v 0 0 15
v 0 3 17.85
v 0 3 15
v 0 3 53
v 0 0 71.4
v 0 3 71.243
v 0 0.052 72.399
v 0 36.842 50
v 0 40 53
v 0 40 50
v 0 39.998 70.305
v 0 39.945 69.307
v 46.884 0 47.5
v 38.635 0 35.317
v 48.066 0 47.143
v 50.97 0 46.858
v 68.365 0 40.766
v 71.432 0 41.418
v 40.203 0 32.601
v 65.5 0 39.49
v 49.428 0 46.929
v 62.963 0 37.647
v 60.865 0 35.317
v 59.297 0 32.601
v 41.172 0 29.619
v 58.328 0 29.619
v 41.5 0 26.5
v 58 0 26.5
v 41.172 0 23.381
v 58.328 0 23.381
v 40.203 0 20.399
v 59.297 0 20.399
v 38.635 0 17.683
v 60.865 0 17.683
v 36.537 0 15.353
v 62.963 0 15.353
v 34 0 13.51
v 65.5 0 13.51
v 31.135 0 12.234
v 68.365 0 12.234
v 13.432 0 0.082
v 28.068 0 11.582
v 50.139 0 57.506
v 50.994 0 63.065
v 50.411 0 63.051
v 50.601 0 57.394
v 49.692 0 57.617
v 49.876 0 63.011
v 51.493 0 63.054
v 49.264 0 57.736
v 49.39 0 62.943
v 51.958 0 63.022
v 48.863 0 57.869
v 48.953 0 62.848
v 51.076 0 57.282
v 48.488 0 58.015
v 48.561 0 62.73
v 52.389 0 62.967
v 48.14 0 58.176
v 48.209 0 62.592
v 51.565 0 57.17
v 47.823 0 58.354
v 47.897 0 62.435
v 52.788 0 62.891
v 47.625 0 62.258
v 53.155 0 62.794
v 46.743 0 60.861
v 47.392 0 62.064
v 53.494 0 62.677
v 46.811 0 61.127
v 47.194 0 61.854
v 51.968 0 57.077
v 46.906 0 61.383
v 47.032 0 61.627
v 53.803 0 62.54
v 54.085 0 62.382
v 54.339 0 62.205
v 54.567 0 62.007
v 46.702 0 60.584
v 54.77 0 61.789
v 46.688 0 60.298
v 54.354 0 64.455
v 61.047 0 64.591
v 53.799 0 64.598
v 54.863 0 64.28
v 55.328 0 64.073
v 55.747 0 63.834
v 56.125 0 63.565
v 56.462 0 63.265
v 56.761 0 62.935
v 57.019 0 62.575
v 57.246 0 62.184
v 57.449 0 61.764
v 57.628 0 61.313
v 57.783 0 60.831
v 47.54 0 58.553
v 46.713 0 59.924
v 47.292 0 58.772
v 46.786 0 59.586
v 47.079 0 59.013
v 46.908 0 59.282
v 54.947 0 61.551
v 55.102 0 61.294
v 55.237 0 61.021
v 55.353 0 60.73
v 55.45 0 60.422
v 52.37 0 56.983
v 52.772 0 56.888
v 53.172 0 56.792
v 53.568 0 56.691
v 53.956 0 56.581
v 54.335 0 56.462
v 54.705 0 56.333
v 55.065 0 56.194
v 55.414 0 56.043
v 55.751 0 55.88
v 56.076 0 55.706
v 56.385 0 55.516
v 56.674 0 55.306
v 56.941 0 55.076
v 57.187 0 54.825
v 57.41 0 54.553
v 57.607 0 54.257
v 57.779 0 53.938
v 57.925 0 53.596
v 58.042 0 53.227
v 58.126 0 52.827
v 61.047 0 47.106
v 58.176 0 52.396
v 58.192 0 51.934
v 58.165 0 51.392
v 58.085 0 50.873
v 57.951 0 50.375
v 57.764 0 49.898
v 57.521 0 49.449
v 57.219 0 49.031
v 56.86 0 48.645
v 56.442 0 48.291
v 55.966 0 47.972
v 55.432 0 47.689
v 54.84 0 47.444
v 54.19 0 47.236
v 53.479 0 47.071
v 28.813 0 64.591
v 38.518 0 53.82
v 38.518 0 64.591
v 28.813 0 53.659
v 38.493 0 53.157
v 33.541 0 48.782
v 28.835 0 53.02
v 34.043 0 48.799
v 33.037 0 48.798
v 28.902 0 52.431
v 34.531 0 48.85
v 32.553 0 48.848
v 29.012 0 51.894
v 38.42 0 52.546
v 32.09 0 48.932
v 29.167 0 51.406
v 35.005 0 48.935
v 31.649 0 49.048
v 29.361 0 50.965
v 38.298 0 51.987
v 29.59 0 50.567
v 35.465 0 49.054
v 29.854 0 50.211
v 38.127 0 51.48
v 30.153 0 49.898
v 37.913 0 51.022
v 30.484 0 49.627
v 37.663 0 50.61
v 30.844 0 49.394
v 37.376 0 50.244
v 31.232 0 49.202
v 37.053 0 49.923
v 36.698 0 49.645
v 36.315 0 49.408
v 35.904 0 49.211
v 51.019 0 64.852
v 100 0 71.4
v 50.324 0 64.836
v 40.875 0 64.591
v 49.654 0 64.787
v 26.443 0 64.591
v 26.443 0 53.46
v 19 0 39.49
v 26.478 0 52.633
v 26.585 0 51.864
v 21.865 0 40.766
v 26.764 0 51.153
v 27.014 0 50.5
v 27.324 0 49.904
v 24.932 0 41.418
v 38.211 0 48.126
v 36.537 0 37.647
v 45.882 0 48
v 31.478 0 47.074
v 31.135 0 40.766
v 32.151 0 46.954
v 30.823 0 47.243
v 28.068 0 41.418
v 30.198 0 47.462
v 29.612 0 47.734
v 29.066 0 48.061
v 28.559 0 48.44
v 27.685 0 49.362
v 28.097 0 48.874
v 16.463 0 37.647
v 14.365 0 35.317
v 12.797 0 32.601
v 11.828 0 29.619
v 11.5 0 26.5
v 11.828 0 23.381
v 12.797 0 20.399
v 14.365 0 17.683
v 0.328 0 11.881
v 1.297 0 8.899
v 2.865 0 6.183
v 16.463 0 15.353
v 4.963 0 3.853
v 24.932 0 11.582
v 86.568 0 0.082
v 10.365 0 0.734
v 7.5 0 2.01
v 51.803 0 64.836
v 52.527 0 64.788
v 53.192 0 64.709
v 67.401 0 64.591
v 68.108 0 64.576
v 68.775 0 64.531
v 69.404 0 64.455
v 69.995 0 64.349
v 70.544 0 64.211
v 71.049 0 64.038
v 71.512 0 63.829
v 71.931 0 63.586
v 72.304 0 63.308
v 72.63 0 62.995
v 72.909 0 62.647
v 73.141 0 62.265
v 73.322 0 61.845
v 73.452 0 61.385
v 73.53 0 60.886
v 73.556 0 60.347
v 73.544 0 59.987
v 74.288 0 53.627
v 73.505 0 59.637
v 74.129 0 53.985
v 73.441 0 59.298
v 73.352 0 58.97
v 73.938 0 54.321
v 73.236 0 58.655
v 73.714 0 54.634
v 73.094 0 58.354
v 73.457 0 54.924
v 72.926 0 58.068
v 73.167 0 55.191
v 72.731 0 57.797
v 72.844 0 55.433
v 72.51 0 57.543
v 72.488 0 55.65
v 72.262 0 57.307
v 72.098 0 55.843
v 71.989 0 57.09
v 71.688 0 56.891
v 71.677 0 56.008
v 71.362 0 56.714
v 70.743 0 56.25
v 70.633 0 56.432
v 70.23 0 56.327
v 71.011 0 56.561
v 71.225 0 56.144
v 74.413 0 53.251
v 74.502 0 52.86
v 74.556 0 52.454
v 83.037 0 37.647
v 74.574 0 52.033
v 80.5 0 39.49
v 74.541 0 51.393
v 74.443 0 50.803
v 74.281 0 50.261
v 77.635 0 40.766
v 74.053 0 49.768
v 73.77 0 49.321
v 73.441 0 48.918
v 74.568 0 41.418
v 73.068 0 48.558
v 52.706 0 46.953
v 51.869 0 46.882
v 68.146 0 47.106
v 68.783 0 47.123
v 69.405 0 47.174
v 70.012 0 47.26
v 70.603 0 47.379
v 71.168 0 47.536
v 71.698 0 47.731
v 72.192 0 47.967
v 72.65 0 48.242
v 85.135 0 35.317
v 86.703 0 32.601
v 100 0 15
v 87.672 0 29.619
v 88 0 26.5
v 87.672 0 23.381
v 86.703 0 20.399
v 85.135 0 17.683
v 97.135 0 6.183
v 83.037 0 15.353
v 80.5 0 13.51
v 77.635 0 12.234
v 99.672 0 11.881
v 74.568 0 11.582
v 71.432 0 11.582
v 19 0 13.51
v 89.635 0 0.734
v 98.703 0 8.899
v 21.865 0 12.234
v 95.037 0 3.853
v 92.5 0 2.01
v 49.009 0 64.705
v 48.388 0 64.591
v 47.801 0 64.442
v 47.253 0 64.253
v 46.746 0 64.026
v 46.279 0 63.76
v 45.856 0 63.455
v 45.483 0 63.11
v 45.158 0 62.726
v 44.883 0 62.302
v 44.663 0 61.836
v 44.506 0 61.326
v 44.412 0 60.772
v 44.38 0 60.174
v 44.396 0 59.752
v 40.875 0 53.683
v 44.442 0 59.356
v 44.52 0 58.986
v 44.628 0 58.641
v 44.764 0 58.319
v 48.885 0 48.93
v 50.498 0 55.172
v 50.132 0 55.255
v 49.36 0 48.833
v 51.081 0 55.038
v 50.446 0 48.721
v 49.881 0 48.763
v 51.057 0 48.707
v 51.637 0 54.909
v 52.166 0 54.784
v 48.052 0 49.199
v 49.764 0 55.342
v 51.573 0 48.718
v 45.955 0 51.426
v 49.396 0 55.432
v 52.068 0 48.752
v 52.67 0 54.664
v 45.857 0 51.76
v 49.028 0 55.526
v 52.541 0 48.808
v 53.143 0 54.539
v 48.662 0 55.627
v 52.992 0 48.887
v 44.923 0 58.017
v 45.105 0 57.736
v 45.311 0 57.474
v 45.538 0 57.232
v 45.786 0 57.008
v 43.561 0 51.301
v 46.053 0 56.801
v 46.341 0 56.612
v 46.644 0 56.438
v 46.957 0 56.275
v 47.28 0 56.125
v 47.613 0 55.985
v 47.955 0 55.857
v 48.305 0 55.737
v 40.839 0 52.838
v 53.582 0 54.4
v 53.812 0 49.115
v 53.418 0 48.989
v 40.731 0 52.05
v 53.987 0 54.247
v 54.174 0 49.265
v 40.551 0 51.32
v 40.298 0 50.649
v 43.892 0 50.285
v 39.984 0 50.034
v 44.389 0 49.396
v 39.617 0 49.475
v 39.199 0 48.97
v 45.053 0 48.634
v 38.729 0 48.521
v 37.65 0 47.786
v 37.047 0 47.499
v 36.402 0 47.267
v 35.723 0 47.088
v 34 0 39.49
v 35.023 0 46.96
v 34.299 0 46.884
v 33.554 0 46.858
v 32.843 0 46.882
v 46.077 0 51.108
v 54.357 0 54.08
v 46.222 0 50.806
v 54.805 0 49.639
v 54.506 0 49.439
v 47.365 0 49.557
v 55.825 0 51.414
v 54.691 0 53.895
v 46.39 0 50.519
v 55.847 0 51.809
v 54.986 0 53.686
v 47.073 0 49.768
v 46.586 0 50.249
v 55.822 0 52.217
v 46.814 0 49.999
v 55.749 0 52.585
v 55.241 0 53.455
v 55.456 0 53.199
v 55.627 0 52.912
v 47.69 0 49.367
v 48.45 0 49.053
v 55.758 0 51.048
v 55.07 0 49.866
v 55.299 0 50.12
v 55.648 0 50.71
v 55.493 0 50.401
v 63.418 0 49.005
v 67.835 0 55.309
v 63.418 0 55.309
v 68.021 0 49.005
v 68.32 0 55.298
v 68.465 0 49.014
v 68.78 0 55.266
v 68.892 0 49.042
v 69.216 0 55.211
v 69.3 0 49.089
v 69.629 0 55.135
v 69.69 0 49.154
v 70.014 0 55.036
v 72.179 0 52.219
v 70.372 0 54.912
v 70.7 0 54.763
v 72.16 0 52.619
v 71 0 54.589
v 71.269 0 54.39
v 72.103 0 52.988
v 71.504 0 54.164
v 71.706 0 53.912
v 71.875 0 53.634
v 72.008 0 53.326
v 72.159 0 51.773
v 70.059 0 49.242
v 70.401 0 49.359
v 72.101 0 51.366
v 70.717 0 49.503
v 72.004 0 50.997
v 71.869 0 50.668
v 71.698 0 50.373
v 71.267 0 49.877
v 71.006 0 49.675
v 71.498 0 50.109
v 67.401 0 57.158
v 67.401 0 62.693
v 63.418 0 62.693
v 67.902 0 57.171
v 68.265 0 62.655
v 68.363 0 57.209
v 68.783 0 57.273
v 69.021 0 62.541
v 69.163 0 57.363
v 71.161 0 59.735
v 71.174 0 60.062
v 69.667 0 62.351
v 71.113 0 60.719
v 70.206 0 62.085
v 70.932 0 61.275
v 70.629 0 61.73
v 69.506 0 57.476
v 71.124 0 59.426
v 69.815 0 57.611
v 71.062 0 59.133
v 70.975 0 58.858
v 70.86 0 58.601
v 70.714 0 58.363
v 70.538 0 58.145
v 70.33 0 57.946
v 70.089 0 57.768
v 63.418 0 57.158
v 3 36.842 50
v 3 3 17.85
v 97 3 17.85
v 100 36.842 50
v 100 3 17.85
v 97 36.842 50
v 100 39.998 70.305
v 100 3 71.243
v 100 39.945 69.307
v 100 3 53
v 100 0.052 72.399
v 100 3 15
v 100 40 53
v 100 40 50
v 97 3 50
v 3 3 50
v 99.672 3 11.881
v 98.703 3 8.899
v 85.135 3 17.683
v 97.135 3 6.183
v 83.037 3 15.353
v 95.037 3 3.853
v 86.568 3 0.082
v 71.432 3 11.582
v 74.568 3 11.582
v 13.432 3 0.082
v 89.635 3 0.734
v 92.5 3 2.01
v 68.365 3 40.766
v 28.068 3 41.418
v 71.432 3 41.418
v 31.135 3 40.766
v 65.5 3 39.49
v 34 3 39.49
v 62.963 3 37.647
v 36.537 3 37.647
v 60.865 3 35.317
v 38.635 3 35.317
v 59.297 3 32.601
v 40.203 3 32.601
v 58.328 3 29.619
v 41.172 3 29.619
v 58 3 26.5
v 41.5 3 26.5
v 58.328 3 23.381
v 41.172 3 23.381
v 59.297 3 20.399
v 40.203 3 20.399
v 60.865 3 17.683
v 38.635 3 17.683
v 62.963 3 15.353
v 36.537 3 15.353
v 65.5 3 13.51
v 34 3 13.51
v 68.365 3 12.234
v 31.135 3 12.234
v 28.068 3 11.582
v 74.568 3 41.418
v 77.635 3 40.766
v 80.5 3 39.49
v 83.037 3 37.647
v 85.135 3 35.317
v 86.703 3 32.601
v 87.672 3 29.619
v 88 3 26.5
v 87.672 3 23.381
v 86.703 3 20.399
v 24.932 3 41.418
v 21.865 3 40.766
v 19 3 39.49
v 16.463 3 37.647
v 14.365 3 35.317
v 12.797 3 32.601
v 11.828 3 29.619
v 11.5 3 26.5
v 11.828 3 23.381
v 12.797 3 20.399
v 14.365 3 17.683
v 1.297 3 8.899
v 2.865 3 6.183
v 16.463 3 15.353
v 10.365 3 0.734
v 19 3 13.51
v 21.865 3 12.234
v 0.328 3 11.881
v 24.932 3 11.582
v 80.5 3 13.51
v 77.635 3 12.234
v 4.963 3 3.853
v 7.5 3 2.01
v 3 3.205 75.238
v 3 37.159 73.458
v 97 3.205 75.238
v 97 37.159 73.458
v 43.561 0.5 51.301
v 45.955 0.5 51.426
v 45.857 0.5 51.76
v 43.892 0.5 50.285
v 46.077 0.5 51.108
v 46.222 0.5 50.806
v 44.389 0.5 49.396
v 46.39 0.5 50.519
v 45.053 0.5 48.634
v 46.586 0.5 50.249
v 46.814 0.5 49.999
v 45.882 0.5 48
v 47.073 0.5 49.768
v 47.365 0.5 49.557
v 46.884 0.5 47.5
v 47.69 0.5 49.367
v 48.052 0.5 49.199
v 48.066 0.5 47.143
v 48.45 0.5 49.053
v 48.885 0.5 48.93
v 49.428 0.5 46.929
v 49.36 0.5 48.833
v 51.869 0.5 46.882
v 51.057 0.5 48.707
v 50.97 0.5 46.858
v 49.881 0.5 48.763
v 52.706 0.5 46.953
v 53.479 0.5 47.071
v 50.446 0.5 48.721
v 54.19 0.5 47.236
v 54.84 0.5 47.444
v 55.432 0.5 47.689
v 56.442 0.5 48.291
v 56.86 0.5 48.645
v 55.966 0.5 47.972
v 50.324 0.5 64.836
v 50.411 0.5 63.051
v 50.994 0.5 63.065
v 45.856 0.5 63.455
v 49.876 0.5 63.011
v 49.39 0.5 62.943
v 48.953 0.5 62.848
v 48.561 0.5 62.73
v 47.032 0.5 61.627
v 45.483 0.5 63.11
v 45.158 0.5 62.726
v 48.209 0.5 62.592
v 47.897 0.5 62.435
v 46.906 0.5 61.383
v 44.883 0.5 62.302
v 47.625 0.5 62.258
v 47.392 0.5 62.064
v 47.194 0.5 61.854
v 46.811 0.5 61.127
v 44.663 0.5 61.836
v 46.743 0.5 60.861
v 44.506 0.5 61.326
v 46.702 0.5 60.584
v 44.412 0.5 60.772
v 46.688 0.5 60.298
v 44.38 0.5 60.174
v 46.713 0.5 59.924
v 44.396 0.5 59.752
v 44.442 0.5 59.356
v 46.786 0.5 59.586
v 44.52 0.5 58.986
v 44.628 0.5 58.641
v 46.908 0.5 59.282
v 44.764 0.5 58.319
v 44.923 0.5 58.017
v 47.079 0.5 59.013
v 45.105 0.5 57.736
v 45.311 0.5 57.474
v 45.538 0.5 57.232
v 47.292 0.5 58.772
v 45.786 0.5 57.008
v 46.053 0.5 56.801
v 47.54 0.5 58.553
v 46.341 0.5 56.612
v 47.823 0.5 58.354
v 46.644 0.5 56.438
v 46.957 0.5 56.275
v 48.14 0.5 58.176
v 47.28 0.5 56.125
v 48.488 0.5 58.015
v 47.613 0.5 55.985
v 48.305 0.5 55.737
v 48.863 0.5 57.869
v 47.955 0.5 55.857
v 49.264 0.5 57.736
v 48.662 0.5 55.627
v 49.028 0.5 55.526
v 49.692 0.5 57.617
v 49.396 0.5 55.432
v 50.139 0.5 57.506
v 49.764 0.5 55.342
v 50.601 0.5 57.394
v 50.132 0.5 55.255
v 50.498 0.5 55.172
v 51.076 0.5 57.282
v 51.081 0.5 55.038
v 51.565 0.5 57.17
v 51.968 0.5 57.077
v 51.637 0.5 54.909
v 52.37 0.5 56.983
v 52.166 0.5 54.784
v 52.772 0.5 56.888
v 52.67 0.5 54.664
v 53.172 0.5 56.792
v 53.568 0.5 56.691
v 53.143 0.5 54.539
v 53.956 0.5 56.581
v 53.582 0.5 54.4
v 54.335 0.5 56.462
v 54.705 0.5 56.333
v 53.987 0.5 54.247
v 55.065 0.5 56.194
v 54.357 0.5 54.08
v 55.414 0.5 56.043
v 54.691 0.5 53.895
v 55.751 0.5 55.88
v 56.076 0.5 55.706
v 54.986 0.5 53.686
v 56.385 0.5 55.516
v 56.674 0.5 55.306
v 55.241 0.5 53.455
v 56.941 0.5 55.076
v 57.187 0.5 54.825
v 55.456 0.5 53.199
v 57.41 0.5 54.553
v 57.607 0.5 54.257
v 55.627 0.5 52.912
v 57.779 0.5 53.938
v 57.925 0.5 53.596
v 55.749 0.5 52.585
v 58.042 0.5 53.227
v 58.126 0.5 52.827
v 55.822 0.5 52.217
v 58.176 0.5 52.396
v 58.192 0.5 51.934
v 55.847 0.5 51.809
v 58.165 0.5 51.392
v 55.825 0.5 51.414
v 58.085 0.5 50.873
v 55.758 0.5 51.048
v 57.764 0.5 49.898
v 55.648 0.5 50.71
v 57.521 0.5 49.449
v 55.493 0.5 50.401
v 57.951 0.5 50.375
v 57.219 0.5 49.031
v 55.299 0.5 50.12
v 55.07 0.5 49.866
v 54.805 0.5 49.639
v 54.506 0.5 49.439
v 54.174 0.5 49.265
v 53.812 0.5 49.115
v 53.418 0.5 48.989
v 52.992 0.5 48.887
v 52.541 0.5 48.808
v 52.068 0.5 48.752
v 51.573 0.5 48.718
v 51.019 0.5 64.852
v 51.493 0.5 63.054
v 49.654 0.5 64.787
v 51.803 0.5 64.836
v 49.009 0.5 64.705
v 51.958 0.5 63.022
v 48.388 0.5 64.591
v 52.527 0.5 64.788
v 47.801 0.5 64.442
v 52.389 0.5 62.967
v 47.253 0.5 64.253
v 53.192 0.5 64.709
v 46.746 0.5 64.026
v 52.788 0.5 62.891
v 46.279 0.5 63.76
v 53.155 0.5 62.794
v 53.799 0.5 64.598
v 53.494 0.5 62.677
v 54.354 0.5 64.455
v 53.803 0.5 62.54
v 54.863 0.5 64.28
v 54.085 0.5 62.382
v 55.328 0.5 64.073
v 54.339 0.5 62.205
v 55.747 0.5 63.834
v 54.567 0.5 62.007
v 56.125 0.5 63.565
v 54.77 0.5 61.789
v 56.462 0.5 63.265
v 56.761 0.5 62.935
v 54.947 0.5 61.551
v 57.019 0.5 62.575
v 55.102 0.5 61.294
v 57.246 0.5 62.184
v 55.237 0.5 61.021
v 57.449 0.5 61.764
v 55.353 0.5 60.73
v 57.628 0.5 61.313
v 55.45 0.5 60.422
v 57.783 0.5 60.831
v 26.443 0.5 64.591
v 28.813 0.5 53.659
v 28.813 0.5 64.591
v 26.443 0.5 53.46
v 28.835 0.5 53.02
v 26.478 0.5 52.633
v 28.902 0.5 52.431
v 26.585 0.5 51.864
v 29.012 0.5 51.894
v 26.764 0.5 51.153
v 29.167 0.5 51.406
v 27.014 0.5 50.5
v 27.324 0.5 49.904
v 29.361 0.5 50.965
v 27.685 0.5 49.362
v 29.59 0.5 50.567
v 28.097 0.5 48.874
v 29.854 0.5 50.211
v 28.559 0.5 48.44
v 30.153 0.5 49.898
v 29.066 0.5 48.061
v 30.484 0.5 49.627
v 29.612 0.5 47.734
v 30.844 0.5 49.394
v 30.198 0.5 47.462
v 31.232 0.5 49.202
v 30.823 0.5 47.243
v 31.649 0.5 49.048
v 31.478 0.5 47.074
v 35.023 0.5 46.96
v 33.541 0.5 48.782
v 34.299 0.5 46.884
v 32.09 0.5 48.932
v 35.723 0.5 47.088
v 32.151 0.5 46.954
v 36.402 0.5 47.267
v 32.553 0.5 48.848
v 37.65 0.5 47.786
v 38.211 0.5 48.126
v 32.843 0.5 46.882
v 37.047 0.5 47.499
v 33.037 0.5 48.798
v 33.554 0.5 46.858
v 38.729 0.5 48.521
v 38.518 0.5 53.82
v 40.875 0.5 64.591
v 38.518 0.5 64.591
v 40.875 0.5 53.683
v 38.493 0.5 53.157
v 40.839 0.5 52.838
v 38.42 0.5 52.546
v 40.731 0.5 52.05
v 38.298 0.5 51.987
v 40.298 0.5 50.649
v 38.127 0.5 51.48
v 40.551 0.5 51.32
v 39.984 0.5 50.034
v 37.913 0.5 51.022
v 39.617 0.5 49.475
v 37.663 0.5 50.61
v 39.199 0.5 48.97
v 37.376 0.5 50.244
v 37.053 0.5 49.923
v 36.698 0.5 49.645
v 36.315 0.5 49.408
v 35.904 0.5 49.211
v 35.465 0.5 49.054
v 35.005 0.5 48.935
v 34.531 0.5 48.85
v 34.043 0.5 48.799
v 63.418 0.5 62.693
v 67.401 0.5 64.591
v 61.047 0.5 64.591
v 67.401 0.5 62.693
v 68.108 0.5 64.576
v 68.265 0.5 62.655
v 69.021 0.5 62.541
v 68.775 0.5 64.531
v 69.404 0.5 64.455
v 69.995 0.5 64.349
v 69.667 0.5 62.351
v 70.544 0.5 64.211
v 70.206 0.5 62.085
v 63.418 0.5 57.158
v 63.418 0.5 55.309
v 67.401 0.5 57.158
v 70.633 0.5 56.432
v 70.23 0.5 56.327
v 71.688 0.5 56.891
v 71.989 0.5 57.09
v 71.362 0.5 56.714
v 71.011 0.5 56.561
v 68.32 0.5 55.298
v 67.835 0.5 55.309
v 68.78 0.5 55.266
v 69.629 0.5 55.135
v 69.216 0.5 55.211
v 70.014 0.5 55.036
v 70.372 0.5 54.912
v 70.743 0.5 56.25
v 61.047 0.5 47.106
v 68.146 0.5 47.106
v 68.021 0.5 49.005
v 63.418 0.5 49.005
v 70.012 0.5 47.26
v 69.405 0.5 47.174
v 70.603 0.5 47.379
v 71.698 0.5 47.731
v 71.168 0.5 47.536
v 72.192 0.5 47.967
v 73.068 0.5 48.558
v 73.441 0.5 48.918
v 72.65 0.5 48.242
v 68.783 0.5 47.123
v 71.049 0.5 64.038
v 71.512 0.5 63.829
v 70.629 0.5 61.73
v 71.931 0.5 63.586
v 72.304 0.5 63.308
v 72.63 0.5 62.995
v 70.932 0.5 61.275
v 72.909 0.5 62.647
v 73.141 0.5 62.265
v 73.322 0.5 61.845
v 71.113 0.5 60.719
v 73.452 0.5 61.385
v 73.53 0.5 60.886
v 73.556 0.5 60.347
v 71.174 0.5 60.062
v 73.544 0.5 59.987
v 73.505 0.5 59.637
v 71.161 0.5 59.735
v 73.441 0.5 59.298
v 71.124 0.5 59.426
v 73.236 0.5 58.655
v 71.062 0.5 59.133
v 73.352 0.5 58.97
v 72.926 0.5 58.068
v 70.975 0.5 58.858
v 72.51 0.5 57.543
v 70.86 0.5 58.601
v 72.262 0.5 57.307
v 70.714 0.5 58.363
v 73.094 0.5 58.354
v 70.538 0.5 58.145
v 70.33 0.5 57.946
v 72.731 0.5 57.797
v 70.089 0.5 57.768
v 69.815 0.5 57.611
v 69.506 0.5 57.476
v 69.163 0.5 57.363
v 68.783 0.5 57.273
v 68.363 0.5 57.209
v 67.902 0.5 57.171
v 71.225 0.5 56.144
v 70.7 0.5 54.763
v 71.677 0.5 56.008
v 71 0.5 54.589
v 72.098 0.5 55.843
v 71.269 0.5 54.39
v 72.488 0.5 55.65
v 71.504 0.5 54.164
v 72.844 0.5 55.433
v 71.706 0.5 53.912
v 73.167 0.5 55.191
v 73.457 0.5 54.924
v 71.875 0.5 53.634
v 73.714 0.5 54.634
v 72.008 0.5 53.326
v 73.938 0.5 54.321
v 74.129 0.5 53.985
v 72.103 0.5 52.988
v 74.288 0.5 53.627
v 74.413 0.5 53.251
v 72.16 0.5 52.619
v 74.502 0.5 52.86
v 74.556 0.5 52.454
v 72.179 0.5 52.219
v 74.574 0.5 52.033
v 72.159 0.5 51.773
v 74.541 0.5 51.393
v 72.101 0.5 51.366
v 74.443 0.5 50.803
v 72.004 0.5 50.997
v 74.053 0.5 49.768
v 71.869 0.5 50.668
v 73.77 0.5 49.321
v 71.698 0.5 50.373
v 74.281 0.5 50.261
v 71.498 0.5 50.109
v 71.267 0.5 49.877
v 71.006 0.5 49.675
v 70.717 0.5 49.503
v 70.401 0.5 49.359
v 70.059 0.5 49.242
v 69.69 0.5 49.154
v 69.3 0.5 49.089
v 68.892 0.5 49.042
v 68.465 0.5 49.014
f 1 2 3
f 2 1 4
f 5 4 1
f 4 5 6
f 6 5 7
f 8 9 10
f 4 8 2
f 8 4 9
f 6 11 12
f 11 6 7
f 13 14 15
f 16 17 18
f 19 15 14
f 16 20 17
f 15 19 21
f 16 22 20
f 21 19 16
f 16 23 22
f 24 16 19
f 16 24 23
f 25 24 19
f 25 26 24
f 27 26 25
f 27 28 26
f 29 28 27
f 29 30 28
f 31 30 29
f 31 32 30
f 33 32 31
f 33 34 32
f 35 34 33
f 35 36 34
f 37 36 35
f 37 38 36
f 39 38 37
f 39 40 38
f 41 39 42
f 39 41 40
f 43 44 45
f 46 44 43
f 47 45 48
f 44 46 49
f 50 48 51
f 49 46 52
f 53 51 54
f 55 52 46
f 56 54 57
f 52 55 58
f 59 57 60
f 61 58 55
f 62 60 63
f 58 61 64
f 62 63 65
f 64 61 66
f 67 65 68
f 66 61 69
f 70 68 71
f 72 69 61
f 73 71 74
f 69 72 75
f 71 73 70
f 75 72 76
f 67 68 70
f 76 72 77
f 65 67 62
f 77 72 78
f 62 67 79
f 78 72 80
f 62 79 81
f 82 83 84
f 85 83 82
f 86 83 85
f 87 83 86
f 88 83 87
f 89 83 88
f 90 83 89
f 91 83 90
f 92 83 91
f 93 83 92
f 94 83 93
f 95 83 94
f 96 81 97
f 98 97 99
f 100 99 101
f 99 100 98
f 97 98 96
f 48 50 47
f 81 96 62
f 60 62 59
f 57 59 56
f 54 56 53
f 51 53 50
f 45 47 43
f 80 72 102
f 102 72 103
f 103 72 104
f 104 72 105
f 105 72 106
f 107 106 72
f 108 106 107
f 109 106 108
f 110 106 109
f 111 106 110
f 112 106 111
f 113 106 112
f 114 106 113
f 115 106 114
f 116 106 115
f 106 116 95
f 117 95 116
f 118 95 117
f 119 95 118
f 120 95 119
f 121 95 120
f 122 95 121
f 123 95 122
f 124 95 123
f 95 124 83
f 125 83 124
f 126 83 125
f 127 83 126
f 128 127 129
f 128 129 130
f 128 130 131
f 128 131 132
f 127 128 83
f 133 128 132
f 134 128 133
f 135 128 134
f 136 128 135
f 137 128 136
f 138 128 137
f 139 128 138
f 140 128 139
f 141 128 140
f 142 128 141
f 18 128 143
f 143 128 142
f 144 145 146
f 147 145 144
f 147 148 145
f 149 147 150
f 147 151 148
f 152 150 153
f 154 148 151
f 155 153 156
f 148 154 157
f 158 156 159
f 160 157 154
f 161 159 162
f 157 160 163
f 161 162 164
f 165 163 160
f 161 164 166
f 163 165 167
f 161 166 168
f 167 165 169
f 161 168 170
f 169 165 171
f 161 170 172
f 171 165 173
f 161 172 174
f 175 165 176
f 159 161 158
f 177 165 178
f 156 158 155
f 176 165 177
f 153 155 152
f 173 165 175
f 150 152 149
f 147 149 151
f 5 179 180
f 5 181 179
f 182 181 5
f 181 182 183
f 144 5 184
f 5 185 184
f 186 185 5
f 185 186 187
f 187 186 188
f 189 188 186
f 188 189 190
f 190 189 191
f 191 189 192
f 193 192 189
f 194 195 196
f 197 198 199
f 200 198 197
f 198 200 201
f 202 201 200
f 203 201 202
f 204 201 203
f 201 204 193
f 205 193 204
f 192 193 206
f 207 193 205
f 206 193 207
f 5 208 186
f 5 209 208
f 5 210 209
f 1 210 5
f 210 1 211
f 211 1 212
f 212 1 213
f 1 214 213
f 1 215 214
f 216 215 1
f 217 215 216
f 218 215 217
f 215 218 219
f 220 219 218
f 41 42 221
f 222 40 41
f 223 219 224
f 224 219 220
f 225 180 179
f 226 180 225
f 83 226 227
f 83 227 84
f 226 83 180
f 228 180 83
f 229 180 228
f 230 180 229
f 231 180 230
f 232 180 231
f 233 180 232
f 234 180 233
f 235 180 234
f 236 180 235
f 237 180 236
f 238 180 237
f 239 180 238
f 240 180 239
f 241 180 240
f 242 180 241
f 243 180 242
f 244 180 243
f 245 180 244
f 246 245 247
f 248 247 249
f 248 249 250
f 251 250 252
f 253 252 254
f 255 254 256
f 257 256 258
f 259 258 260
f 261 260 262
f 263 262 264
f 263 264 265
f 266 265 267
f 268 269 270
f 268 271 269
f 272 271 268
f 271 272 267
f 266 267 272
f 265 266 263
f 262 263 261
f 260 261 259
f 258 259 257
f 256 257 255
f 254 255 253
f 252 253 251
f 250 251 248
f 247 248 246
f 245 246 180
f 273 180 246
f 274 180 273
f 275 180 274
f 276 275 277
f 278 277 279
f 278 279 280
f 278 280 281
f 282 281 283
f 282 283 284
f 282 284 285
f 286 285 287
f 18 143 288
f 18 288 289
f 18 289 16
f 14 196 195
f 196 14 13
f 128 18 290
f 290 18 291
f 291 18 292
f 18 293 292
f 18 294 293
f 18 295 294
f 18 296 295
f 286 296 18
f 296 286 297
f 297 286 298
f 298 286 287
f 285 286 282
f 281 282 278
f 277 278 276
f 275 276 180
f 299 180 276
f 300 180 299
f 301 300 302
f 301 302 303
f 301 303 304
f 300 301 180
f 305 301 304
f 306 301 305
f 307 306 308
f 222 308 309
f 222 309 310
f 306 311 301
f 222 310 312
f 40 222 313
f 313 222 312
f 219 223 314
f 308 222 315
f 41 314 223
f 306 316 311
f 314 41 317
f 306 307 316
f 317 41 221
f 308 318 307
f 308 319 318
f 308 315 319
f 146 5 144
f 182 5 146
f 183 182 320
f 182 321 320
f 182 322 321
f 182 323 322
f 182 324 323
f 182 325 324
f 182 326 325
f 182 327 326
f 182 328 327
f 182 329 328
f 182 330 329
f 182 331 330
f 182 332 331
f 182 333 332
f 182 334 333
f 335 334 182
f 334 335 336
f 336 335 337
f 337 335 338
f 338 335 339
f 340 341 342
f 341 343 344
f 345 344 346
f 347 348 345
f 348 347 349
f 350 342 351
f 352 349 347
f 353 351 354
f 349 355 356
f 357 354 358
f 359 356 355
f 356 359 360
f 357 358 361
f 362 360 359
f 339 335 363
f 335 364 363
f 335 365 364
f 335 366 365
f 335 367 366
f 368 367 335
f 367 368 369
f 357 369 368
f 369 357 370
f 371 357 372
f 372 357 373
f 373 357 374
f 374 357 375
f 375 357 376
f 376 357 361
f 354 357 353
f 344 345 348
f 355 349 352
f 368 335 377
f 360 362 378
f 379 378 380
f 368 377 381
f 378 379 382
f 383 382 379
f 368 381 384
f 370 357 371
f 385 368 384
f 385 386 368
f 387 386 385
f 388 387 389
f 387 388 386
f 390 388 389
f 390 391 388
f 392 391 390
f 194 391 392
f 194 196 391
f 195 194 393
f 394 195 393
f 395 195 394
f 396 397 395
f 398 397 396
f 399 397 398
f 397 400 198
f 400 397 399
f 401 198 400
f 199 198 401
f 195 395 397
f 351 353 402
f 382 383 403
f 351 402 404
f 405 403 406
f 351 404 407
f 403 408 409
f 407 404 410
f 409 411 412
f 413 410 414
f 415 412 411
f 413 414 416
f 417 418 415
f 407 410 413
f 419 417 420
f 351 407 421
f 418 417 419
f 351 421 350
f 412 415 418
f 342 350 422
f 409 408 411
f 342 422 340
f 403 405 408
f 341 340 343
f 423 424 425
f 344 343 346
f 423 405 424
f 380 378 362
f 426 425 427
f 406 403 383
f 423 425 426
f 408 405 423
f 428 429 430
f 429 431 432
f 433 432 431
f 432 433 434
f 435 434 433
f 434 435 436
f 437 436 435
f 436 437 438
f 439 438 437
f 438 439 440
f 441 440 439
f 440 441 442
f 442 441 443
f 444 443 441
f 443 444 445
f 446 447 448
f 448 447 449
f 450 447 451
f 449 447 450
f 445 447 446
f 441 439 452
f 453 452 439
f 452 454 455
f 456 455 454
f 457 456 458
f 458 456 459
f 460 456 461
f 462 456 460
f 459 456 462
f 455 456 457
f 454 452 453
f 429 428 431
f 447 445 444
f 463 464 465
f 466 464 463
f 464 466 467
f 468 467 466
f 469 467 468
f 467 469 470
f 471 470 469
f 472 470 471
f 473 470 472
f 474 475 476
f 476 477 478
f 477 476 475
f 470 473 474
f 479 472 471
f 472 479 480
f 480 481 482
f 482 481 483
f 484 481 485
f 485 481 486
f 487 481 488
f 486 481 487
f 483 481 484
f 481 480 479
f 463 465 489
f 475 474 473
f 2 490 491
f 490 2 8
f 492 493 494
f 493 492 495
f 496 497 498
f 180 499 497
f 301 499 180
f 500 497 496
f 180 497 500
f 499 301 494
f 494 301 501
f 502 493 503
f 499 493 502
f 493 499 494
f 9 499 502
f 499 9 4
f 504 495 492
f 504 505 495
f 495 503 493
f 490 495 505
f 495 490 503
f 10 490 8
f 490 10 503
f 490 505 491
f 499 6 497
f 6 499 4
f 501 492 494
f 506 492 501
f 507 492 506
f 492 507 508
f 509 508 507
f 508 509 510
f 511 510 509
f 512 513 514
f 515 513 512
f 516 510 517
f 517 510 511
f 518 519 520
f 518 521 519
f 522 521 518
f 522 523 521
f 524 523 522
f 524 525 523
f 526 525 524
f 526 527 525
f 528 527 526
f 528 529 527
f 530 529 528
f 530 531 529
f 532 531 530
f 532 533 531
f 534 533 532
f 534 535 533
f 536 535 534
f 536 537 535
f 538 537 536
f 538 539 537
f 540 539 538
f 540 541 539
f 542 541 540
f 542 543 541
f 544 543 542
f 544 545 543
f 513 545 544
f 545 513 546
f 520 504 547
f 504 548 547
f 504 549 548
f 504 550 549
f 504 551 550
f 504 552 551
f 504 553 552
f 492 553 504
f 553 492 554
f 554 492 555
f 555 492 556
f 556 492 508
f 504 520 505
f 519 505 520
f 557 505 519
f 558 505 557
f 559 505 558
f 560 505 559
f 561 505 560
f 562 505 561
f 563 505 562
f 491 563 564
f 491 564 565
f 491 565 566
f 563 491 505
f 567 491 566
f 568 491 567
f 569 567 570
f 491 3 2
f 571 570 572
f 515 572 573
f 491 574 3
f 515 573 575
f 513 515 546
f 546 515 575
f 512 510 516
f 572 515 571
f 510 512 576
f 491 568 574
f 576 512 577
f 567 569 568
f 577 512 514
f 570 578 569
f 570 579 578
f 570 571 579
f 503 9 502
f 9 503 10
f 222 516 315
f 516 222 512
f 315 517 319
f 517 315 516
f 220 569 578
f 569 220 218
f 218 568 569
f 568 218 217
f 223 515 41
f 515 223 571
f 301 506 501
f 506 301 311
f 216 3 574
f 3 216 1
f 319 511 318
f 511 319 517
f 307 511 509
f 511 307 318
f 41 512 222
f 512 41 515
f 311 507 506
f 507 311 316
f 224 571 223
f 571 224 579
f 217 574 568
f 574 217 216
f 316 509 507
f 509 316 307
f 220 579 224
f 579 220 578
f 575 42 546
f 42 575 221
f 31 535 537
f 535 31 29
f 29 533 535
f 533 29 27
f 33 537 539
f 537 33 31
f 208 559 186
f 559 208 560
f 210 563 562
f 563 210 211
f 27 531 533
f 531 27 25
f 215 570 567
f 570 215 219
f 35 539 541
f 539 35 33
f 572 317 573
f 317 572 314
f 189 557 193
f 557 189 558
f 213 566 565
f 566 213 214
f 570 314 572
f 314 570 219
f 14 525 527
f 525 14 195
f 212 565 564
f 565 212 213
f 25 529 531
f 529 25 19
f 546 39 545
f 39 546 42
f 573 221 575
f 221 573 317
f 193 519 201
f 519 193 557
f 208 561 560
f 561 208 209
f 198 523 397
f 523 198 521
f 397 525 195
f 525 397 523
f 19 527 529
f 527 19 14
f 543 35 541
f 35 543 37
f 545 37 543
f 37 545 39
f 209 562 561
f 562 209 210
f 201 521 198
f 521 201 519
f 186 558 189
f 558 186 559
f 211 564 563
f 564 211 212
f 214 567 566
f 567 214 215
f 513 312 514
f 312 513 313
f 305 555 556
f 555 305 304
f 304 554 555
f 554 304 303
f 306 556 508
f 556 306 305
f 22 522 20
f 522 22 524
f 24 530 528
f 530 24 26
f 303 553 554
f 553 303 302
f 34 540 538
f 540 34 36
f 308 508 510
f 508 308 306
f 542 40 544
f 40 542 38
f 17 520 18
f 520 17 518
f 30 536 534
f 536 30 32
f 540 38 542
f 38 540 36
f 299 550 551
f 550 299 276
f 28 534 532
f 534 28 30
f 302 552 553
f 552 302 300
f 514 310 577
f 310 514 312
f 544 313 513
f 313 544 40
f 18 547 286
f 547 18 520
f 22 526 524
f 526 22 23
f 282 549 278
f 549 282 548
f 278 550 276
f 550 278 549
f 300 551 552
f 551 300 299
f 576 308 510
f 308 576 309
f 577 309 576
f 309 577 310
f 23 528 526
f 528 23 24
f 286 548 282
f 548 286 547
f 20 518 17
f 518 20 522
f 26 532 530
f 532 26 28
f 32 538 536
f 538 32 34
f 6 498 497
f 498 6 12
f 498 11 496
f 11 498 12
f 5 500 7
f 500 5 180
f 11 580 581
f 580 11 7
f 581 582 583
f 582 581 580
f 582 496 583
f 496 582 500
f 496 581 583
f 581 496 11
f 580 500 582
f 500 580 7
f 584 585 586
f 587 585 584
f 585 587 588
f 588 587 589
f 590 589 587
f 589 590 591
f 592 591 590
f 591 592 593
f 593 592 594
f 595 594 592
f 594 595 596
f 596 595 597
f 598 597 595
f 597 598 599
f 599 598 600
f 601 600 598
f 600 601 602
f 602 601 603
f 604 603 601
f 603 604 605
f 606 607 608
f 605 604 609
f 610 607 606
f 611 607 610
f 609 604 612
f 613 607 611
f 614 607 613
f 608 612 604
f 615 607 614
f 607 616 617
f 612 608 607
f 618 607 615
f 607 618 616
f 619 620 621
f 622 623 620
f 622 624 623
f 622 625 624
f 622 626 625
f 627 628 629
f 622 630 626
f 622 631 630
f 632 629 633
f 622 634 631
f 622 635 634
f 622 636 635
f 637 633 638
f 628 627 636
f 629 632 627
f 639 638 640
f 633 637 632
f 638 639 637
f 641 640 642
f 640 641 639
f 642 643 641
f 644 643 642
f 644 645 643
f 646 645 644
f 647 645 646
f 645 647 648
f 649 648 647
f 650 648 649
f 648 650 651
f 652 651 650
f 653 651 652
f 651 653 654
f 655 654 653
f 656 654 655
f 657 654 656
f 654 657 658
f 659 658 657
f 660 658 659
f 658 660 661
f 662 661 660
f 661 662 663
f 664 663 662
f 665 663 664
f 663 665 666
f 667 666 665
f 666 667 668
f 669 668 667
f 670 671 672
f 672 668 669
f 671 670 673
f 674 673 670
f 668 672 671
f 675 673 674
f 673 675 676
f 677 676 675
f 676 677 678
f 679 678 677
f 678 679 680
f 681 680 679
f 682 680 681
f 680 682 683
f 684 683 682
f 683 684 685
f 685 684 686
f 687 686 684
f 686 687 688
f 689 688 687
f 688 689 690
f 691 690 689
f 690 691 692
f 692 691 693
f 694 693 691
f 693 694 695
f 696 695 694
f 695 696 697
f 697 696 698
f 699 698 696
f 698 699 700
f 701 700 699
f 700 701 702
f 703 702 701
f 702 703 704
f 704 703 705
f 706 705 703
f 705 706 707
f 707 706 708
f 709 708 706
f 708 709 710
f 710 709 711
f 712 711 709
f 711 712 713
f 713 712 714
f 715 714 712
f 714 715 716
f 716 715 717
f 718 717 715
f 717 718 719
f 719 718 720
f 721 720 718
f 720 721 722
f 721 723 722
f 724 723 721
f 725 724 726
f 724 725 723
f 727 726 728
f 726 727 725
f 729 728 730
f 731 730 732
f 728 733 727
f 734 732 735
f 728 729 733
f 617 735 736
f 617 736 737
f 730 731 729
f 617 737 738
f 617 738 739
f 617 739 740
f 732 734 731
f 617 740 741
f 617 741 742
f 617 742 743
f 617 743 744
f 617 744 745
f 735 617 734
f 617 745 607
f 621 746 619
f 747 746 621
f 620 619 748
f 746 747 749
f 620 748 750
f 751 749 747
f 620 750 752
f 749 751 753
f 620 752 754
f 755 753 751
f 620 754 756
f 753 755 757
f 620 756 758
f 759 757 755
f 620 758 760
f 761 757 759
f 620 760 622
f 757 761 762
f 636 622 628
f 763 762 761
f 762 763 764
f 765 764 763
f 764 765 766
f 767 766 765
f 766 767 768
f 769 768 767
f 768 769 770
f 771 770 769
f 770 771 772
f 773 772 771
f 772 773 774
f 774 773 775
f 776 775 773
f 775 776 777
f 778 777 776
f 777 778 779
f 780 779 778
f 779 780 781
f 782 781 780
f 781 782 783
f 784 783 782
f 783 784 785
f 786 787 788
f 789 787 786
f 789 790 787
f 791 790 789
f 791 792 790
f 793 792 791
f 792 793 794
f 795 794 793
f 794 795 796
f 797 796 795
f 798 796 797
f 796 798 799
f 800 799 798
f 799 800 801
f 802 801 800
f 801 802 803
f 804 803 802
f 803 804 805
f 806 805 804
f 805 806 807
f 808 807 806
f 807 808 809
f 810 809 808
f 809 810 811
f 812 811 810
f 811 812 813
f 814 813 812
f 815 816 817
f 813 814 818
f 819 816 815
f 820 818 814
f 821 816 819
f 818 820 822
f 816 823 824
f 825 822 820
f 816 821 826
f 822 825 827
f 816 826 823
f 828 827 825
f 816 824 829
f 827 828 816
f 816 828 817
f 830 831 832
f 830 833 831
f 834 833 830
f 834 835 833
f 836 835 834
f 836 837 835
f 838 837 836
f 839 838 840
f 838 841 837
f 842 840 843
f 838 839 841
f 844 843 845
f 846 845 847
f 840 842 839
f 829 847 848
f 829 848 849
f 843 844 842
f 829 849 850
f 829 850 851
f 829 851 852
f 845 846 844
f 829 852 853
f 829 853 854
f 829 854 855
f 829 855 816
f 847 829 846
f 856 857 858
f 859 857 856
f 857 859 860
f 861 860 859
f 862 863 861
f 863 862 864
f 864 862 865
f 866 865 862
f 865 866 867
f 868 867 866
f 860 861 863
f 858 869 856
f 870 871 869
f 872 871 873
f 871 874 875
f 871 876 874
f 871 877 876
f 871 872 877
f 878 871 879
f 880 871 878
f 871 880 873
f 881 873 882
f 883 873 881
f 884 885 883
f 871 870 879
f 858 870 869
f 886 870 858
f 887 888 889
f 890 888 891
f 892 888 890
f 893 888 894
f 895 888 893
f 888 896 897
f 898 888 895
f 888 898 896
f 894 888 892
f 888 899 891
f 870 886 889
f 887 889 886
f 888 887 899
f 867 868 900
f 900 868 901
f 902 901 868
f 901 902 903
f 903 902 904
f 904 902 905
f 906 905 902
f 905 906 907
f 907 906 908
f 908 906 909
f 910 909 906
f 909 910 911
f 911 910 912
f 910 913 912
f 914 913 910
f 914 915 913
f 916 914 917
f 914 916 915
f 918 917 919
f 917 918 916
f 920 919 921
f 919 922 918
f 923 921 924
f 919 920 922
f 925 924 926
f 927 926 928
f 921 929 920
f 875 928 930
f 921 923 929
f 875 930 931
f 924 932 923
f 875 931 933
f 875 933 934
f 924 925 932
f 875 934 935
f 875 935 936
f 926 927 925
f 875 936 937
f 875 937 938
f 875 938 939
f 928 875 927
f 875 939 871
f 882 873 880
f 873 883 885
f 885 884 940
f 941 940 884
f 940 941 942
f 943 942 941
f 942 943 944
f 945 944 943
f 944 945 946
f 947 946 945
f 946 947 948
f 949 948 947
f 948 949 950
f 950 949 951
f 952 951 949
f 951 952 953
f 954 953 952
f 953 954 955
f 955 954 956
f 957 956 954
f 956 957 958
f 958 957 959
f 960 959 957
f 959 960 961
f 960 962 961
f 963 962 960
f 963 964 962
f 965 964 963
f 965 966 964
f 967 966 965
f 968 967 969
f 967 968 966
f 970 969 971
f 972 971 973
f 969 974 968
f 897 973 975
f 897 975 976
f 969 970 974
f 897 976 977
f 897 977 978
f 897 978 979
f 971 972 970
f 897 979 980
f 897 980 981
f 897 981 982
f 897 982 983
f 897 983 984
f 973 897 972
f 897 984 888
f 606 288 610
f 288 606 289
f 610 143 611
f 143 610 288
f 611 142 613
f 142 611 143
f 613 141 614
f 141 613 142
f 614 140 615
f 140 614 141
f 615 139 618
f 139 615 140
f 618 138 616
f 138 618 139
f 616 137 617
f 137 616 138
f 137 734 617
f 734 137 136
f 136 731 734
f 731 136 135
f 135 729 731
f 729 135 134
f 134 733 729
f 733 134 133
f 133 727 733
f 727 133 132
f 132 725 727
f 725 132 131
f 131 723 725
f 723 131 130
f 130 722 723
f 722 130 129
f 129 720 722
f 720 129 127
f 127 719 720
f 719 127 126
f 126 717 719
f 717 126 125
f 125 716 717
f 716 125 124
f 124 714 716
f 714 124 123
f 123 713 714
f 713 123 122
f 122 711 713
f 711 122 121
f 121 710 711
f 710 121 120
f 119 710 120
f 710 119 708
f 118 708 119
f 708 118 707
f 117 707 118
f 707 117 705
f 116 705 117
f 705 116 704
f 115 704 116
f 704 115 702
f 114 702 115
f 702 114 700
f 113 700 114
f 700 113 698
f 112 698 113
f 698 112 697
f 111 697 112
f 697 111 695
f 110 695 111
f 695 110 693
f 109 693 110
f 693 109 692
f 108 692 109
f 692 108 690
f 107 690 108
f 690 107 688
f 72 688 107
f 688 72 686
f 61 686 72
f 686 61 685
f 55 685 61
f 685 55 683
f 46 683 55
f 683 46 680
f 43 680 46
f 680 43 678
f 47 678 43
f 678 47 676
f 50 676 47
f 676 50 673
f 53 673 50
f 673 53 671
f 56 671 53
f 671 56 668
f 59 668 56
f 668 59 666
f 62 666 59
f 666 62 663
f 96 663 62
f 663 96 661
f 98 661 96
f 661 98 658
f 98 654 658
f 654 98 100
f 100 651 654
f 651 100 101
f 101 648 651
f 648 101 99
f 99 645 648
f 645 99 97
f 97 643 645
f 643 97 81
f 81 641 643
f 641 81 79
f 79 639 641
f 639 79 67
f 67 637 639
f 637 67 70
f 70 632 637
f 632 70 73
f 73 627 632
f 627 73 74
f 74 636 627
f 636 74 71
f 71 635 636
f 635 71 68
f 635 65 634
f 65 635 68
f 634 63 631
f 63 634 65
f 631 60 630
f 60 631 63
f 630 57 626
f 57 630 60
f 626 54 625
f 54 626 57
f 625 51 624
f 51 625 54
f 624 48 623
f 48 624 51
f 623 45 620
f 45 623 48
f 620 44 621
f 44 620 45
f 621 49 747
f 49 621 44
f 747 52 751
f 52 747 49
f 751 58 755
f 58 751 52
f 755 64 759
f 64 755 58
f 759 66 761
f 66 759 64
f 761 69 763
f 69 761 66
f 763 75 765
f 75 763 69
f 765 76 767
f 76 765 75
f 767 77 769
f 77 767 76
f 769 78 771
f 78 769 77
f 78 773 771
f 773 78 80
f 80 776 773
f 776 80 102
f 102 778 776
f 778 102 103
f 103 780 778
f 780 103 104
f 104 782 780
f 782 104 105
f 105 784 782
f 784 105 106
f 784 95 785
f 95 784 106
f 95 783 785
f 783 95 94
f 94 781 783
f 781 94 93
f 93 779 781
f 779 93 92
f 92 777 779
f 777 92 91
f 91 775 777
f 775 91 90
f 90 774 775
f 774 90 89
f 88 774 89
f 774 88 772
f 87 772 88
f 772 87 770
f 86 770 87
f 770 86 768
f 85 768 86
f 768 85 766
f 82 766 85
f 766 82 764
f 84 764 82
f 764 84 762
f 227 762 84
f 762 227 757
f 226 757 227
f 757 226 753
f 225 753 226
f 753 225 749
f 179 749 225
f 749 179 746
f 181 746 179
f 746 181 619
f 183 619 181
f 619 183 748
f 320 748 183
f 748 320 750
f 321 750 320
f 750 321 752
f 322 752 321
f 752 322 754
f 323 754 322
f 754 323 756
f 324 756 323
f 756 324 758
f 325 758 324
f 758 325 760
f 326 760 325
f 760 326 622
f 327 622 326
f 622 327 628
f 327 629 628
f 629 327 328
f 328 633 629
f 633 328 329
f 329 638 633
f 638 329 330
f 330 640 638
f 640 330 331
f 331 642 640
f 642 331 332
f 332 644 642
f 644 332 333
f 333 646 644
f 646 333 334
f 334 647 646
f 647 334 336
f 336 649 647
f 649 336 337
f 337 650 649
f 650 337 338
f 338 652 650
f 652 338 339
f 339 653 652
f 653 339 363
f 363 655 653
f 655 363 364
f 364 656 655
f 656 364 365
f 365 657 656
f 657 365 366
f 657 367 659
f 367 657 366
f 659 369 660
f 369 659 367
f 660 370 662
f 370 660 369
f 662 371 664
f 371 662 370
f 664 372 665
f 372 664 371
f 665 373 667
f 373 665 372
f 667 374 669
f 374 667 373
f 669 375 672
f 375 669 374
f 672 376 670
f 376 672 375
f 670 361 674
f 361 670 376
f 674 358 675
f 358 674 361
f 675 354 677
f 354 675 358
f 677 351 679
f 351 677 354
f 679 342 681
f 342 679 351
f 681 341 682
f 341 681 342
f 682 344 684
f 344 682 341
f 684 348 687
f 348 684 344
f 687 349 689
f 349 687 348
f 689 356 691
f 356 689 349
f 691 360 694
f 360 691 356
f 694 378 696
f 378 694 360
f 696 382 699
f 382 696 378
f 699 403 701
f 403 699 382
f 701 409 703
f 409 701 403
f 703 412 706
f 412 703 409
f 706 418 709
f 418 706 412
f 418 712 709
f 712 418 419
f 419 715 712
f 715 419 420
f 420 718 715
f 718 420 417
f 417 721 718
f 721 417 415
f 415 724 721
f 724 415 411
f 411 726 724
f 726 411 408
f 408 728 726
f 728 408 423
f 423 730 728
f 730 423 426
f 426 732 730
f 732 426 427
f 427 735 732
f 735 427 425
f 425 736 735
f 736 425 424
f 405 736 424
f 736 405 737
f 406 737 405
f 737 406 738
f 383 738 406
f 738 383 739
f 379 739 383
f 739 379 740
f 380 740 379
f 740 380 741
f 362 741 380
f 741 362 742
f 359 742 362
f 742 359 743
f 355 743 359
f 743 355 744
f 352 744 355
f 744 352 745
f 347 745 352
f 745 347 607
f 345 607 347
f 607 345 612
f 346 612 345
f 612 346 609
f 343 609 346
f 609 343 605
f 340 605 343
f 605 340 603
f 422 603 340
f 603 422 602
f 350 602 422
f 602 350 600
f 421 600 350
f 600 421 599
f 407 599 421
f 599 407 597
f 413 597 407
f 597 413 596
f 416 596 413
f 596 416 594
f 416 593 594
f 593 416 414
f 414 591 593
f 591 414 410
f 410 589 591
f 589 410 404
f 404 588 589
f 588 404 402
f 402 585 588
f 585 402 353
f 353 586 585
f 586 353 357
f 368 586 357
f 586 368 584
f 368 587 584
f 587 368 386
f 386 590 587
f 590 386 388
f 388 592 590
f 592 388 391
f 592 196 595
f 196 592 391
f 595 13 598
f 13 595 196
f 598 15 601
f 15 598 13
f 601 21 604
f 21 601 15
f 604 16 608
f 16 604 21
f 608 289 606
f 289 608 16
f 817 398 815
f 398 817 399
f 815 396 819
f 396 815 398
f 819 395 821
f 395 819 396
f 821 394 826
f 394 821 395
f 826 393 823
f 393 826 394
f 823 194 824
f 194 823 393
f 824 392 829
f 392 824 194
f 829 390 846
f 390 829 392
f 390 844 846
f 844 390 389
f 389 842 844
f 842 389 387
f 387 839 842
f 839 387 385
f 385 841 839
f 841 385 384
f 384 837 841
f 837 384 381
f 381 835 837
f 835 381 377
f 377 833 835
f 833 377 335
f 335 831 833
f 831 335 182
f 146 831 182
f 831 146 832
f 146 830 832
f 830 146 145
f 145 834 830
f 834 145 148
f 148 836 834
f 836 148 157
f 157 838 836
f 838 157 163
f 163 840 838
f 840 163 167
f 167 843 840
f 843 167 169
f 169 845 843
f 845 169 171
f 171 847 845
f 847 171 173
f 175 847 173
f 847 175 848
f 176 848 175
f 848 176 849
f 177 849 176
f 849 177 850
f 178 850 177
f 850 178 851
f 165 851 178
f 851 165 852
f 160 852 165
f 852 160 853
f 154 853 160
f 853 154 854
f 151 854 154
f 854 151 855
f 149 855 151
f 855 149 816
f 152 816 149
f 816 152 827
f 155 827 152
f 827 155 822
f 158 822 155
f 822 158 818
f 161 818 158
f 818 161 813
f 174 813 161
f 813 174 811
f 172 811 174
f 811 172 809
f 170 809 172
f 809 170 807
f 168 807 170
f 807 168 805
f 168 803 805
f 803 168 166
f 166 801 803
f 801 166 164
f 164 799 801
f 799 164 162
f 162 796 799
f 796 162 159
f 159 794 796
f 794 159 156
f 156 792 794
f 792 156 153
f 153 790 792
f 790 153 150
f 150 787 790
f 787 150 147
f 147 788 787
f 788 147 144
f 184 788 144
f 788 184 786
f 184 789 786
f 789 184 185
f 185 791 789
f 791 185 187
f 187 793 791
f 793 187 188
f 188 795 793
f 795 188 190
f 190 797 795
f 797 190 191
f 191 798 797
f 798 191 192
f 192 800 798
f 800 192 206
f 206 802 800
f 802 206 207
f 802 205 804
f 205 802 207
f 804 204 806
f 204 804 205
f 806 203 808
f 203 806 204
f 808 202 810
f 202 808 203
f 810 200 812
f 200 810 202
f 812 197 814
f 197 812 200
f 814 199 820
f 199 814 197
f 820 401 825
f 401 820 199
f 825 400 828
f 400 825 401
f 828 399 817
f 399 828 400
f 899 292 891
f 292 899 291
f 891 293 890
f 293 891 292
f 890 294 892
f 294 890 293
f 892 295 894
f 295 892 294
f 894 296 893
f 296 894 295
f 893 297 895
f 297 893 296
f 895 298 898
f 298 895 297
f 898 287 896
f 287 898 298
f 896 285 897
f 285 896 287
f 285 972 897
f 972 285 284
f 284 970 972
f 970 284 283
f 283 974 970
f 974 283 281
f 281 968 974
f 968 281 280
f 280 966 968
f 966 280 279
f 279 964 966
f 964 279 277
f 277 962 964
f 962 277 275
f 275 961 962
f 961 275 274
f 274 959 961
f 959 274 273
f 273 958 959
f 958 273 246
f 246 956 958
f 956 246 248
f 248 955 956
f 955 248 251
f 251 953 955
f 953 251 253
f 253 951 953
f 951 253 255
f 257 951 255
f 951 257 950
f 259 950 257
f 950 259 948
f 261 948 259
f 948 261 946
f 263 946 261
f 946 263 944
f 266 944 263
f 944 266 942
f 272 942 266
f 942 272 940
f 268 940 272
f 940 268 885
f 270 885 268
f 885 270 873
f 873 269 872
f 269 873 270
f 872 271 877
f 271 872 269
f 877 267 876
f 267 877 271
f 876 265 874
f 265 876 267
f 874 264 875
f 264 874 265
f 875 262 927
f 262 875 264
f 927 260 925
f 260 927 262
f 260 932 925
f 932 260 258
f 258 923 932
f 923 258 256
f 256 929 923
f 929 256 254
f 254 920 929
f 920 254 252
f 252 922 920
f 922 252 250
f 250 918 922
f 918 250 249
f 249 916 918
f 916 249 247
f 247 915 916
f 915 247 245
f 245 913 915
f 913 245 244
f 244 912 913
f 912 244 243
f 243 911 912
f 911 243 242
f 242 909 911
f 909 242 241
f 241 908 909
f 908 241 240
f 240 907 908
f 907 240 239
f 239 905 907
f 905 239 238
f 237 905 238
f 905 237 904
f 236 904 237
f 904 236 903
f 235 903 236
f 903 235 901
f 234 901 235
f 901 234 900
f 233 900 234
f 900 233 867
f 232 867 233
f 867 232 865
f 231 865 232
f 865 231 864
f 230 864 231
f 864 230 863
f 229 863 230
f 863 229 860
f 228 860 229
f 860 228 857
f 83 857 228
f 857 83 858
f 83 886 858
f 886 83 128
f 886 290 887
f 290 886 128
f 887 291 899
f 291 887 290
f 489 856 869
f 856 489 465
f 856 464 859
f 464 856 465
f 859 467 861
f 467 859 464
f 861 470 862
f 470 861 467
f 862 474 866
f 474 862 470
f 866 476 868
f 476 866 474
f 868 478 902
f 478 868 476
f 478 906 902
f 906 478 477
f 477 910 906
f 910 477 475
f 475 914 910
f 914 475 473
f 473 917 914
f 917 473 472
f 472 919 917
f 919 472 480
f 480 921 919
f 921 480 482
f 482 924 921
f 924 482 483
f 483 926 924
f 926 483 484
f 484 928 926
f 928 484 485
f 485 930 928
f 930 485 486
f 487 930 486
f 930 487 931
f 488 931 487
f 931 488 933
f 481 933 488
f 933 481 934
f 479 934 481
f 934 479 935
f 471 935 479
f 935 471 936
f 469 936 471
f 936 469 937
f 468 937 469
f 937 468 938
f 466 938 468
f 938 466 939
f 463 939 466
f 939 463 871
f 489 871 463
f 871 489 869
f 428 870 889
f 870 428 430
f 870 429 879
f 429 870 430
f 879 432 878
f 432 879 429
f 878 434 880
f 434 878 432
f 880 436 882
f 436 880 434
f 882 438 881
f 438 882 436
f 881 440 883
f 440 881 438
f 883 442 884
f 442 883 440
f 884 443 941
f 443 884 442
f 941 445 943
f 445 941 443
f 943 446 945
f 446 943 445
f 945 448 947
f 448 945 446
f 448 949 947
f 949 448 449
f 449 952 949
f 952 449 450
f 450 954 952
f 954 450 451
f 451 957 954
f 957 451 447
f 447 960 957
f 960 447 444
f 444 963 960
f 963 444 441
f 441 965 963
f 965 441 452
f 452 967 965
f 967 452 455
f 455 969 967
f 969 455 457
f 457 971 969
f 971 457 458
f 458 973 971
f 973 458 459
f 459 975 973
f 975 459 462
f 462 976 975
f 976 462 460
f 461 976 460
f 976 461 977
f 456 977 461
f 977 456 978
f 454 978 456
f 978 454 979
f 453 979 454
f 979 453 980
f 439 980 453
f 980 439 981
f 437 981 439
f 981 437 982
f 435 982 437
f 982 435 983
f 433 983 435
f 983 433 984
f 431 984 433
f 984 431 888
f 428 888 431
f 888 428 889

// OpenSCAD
dia = 30;
spacing = 20;
num = 2;

clipH = 18.3;
clipD = 40;

wall = 3;

w = (dia+spacing) * num;
h = dia+spacing+wall;
d = 60;

tiny = 0.001;

$fn = 30;

module washer() {
  linear_extrude(2)
    difference() {
      circle(d=dia+10);
      circle(d=dia);
    }
}

*washer();

difference() {
  body();
  translate([w/2,0.5,(h-dia)/2+dia/2+spacing+clipH/2])
    rotate([90,0,0])
      linear_extrude(1)
        text("USB", size=clipH, halign="center", valign="center");
}

module body() {
  // Body
  difference() {
    union() {
      r = dia/2;
      // Top
      translate([0,0,h-wall]) cube([w,clipD,wall]);
      // Sides
      difference() {
        translate([0,0,r])
          rotate([90,0,90])
            linear_extrude(w)
               polygon(points=[
                [0,0], [clipD,h-r], [0, h-r]
              ]);
        translate([wall, wall, wall]) cube([w-wall*2,d,h-wall*2]);
      }
      // Front
      hull() {
        translate([0,0,h]) cube([w,wall,tiny]);
        translate([r,0,r]) rotate([-90,0,0]) cylinder(r=r,h=wall);
        translate([w-r,0,r]) rotate([-90,0,0]) cylinder(r=r,h=wall);
      }
    }
    *translate([wall, wall, wall]) cube([w-wall*2,d,h-wall*2]);
    
    // Cutouts
    offset = (h-dia)/2 + dia/2;
    translate([offset,-tiny,offset]) rotate([-90,0,0]) cylinder(d=dia,h=wall+tiny*2);
    translate([offset*2 + spacing,-tiny,offset]) rotate([-90,0,0]) cylinder(d=dia,h=wall+tiny*2);
  }
  // Top clip
  difference() {
    translate([0,0,h]) { // Top of body
      // Front
      cube([w,wall,clipH+0.1]);  
      translate([0,0,clipH+0.1])
        rotate([-3,0,0]) {
          cube([w,clipD,1]);
          translate([0,0,1])
            tcube(w,clipD,wall,wall);
        }
    }
  }
}

// Tapered cube
module tcube(l,w,d,taper) {
  sx=(l-2*taper)/l; sy=(w-2*taper)/w;    // scaling
  translate([l/2,w/2,0])
    linear_extrude(height=d, center=false, convexity=10, scale=[sx,sy])
      translate([-l/2,-w/2,0])
        square([l,w]);
}
